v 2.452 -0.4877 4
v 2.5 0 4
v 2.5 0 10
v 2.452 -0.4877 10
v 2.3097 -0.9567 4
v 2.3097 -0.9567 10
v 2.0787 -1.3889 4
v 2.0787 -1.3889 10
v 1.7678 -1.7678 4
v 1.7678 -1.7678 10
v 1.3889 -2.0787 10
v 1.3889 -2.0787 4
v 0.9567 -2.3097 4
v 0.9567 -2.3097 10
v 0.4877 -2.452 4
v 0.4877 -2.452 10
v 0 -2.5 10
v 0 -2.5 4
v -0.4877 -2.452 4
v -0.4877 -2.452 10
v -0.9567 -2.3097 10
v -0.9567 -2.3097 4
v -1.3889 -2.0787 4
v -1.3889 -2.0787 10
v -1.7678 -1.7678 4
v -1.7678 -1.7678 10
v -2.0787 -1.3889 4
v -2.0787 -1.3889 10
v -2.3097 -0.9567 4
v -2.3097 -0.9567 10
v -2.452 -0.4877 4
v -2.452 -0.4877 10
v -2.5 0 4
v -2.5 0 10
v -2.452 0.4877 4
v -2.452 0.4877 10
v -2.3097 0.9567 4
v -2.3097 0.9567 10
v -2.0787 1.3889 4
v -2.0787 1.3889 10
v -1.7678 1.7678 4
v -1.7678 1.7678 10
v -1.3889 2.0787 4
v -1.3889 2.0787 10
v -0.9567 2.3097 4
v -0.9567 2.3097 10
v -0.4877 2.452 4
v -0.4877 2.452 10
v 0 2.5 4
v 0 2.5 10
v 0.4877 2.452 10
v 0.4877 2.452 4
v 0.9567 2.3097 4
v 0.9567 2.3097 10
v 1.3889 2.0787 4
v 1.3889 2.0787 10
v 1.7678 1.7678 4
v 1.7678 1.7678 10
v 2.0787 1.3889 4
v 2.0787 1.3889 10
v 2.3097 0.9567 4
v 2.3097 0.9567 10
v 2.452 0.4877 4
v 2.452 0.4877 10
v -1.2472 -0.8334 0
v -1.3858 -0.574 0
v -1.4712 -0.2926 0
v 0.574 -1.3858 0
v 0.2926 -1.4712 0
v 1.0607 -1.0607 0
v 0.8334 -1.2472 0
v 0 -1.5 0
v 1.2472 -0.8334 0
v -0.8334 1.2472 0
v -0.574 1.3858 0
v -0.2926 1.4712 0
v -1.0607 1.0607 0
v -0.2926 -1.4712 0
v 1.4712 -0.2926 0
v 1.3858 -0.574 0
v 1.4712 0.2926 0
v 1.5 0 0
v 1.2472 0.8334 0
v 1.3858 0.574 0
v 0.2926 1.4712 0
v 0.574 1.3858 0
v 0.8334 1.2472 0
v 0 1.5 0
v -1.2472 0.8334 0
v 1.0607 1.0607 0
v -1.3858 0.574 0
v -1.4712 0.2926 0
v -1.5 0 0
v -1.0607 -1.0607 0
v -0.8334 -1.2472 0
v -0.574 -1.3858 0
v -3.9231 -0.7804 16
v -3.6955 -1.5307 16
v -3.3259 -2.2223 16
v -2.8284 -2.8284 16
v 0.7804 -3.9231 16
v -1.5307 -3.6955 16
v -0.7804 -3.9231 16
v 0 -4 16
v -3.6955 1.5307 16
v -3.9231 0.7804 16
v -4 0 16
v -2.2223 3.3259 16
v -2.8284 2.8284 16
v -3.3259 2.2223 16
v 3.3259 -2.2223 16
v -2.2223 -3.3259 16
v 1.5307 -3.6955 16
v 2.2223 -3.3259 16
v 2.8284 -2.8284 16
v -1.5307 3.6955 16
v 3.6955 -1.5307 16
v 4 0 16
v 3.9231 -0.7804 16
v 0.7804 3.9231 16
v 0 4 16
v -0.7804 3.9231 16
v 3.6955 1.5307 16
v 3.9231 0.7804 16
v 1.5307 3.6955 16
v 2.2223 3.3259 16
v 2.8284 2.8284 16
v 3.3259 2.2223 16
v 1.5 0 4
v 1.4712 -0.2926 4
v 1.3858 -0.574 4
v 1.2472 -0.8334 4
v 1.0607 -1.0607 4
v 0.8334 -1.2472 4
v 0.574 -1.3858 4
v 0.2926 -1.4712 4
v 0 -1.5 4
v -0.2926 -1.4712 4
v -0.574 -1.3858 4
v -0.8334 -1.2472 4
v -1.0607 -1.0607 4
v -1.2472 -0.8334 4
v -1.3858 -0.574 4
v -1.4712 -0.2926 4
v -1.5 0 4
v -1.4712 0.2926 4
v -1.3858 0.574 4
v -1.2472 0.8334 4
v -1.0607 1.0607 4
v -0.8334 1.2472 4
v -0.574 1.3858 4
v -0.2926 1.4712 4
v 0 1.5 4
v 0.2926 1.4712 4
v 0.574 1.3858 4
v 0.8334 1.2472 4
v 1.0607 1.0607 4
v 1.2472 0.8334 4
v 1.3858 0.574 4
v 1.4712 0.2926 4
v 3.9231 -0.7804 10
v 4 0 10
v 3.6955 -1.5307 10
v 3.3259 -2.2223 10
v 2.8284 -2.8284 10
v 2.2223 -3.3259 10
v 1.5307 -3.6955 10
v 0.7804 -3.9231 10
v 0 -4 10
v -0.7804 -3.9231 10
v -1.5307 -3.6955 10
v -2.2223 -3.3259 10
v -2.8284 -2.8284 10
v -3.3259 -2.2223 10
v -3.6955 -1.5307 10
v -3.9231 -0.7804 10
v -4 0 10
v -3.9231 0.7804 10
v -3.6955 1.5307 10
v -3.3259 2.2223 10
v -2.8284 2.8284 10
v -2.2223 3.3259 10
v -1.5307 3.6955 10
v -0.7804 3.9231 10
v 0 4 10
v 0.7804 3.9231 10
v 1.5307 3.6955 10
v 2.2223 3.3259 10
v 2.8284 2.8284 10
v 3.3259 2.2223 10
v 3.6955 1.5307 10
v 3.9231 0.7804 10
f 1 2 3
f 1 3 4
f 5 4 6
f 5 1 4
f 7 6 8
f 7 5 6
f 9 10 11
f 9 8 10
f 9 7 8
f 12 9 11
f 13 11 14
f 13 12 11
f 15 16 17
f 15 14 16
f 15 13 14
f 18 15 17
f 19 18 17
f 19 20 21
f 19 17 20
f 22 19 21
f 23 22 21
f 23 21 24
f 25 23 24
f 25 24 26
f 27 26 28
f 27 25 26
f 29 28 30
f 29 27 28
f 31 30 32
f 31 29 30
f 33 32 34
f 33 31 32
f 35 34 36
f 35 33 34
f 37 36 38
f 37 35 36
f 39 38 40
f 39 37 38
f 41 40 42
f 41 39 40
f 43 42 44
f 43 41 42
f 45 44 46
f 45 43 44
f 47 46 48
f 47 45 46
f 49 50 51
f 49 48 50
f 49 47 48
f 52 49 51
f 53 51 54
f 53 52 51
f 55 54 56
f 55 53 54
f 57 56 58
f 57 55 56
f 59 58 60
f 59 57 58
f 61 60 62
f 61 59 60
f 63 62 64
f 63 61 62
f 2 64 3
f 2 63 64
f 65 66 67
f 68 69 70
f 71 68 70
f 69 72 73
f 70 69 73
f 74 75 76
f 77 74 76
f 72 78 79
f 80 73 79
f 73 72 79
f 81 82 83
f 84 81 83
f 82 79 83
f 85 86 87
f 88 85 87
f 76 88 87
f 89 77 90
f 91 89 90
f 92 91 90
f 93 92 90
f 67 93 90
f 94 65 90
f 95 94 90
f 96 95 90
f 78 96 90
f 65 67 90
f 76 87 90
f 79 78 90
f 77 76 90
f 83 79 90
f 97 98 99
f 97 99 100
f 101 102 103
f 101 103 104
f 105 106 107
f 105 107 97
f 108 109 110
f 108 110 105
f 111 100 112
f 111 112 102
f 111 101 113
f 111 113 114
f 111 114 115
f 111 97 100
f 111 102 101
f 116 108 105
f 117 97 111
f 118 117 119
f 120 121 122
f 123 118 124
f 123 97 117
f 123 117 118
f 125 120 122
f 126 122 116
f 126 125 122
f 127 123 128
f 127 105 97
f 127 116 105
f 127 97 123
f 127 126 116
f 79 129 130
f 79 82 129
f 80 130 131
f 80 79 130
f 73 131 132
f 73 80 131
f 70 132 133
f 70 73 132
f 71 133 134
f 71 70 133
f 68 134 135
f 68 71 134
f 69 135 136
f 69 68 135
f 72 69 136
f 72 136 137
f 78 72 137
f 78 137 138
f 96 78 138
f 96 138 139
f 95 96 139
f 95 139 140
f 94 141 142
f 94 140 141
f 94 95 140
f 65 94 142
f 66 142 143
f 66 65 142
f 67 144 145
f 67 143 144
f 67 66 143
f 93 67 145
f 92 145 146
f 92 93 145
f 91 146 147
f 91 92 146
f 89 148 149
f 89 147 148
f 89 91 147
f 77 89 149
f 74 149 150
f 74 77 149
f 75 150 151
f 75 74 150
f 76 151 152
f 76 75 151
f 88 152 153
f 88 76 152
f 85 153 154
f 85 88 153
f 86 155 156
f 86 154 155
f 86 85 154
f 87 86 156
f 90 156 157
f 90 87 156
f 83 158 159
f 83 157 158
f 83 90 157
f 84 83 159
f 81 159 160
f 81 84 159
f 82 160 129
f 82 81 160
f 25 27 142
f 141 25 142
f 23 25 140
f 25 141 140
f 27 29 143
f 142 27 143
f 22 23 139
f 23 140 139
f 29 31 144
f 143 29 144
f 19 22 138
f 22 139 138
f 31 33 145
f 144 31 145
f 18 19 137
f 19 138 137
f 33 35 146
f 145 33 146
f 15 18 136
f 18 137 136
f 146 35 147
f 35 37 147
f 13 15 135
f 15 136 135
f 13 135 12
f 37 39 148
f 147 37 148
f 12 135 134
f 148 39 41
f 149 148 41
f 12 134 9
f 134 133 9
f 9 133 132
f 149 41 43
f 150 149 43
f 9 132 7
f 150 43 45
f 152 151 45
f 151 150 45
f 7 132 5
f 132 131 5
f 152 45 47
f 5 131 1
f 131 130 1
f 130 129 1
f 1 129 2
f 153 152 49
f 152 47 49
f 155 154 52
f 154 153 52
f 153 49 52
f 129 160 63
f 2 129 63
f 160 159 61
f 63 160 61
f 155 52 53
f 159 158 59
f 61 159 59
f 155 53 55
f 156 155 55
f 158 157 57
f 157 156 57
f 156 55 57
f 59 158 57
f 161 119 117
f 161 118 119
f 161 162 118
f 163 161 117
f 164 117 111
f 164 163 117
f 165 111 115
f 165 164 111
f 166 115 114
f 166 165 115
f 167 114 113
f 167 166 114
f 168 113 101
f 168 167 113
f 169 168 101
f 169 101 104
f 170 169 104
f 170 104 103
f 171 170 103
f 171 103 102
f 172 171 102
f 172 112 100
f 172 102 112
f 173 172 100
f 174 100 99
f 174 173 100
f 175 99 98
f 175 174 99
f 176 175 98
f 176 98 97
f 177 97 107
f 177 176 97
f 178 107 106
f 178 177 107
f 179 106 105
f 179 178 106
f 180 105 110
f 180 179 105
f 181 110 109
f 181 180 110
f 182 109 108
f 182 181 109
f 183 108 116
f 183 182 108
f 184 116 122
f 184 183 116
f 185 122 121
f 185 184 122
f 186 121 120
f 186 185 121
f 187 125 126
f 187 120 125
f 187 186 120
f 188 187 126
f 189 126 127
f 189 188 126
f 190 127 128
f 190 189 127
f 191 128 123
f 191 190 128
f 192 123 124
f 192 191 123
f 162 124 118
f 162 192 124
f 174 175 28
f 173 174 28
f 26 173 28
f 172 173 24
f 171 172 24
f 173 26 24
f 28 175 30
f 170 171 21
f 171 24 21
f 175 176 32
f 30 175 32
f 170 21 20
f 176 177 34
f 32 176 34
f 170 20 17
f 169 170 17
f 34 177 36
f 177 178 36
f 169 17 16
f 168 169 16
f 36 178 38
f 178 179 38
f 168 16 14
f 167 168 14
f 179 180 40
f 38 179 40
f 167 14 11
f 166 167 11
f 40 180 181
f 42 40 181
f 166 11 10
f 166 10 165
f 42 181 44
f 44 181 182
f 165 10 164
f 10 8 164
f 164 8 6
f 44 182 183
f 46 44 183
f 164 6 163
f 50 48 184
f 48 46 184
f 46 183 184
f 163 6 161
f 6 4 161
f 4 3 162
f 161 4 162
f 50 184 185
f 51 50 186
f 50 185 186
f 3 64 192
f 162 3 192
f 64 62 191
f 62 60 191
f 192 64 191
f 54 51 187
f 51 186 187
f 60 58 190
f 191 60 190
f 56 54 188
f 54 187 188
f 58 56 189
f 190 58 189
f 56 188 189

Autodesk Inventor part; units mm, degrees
ref_plane "YZ Plane" through (0, 0, 0) normal (1, 0, 0) x (0, 1, 0)
ref_plane "XZ Plane" through (0, 0, 0) normal (0, 1, 0) x (-1, 0, 0)
ref_plane "XY Plane" through (0, 0, 0) normal (0, 0, 1) x (1, 0, 0)
sketch "Sketch1" plane through (0, 0, 0) normal (0, 0, 1) x (1, 0, 0)
  circle A0 centre (0, 0) radius 1.5
  dimension "d0" = 3
extrude "Extrusion1" add sketch "Sketch1" along normal blind 4
sketch "Sketch2" plane through (0, 0, 4) normal (0, 0, 1) x (1, 0, 0)
  circle A0 centre (0, 0) radius 1.5 projected
  circle A1 centre (0, 0) radius 2.5
  dimension "d4" = 5
extrude "Extrusion2" add sketch "Sketch2" along normal blind 6 contours A0 | A1
thread "Thread1" size "M5x0.8" class "6g" standard "ANSI Metric M Profile" full length
sketch "Sketch3" plane through (0, 0, 10) normal (0, 0, 1) x (1, 0, 0)
  circle A0 centre (0, 0) radius 2.5 projected
  circle A1 centre (0, 0) radius 4
  dimension "d10" = 8
extrude "Extrusion3" add sketch "Sketch3" along normal blind 6 contours A0 | A1
properties part number "5mm Screw"
